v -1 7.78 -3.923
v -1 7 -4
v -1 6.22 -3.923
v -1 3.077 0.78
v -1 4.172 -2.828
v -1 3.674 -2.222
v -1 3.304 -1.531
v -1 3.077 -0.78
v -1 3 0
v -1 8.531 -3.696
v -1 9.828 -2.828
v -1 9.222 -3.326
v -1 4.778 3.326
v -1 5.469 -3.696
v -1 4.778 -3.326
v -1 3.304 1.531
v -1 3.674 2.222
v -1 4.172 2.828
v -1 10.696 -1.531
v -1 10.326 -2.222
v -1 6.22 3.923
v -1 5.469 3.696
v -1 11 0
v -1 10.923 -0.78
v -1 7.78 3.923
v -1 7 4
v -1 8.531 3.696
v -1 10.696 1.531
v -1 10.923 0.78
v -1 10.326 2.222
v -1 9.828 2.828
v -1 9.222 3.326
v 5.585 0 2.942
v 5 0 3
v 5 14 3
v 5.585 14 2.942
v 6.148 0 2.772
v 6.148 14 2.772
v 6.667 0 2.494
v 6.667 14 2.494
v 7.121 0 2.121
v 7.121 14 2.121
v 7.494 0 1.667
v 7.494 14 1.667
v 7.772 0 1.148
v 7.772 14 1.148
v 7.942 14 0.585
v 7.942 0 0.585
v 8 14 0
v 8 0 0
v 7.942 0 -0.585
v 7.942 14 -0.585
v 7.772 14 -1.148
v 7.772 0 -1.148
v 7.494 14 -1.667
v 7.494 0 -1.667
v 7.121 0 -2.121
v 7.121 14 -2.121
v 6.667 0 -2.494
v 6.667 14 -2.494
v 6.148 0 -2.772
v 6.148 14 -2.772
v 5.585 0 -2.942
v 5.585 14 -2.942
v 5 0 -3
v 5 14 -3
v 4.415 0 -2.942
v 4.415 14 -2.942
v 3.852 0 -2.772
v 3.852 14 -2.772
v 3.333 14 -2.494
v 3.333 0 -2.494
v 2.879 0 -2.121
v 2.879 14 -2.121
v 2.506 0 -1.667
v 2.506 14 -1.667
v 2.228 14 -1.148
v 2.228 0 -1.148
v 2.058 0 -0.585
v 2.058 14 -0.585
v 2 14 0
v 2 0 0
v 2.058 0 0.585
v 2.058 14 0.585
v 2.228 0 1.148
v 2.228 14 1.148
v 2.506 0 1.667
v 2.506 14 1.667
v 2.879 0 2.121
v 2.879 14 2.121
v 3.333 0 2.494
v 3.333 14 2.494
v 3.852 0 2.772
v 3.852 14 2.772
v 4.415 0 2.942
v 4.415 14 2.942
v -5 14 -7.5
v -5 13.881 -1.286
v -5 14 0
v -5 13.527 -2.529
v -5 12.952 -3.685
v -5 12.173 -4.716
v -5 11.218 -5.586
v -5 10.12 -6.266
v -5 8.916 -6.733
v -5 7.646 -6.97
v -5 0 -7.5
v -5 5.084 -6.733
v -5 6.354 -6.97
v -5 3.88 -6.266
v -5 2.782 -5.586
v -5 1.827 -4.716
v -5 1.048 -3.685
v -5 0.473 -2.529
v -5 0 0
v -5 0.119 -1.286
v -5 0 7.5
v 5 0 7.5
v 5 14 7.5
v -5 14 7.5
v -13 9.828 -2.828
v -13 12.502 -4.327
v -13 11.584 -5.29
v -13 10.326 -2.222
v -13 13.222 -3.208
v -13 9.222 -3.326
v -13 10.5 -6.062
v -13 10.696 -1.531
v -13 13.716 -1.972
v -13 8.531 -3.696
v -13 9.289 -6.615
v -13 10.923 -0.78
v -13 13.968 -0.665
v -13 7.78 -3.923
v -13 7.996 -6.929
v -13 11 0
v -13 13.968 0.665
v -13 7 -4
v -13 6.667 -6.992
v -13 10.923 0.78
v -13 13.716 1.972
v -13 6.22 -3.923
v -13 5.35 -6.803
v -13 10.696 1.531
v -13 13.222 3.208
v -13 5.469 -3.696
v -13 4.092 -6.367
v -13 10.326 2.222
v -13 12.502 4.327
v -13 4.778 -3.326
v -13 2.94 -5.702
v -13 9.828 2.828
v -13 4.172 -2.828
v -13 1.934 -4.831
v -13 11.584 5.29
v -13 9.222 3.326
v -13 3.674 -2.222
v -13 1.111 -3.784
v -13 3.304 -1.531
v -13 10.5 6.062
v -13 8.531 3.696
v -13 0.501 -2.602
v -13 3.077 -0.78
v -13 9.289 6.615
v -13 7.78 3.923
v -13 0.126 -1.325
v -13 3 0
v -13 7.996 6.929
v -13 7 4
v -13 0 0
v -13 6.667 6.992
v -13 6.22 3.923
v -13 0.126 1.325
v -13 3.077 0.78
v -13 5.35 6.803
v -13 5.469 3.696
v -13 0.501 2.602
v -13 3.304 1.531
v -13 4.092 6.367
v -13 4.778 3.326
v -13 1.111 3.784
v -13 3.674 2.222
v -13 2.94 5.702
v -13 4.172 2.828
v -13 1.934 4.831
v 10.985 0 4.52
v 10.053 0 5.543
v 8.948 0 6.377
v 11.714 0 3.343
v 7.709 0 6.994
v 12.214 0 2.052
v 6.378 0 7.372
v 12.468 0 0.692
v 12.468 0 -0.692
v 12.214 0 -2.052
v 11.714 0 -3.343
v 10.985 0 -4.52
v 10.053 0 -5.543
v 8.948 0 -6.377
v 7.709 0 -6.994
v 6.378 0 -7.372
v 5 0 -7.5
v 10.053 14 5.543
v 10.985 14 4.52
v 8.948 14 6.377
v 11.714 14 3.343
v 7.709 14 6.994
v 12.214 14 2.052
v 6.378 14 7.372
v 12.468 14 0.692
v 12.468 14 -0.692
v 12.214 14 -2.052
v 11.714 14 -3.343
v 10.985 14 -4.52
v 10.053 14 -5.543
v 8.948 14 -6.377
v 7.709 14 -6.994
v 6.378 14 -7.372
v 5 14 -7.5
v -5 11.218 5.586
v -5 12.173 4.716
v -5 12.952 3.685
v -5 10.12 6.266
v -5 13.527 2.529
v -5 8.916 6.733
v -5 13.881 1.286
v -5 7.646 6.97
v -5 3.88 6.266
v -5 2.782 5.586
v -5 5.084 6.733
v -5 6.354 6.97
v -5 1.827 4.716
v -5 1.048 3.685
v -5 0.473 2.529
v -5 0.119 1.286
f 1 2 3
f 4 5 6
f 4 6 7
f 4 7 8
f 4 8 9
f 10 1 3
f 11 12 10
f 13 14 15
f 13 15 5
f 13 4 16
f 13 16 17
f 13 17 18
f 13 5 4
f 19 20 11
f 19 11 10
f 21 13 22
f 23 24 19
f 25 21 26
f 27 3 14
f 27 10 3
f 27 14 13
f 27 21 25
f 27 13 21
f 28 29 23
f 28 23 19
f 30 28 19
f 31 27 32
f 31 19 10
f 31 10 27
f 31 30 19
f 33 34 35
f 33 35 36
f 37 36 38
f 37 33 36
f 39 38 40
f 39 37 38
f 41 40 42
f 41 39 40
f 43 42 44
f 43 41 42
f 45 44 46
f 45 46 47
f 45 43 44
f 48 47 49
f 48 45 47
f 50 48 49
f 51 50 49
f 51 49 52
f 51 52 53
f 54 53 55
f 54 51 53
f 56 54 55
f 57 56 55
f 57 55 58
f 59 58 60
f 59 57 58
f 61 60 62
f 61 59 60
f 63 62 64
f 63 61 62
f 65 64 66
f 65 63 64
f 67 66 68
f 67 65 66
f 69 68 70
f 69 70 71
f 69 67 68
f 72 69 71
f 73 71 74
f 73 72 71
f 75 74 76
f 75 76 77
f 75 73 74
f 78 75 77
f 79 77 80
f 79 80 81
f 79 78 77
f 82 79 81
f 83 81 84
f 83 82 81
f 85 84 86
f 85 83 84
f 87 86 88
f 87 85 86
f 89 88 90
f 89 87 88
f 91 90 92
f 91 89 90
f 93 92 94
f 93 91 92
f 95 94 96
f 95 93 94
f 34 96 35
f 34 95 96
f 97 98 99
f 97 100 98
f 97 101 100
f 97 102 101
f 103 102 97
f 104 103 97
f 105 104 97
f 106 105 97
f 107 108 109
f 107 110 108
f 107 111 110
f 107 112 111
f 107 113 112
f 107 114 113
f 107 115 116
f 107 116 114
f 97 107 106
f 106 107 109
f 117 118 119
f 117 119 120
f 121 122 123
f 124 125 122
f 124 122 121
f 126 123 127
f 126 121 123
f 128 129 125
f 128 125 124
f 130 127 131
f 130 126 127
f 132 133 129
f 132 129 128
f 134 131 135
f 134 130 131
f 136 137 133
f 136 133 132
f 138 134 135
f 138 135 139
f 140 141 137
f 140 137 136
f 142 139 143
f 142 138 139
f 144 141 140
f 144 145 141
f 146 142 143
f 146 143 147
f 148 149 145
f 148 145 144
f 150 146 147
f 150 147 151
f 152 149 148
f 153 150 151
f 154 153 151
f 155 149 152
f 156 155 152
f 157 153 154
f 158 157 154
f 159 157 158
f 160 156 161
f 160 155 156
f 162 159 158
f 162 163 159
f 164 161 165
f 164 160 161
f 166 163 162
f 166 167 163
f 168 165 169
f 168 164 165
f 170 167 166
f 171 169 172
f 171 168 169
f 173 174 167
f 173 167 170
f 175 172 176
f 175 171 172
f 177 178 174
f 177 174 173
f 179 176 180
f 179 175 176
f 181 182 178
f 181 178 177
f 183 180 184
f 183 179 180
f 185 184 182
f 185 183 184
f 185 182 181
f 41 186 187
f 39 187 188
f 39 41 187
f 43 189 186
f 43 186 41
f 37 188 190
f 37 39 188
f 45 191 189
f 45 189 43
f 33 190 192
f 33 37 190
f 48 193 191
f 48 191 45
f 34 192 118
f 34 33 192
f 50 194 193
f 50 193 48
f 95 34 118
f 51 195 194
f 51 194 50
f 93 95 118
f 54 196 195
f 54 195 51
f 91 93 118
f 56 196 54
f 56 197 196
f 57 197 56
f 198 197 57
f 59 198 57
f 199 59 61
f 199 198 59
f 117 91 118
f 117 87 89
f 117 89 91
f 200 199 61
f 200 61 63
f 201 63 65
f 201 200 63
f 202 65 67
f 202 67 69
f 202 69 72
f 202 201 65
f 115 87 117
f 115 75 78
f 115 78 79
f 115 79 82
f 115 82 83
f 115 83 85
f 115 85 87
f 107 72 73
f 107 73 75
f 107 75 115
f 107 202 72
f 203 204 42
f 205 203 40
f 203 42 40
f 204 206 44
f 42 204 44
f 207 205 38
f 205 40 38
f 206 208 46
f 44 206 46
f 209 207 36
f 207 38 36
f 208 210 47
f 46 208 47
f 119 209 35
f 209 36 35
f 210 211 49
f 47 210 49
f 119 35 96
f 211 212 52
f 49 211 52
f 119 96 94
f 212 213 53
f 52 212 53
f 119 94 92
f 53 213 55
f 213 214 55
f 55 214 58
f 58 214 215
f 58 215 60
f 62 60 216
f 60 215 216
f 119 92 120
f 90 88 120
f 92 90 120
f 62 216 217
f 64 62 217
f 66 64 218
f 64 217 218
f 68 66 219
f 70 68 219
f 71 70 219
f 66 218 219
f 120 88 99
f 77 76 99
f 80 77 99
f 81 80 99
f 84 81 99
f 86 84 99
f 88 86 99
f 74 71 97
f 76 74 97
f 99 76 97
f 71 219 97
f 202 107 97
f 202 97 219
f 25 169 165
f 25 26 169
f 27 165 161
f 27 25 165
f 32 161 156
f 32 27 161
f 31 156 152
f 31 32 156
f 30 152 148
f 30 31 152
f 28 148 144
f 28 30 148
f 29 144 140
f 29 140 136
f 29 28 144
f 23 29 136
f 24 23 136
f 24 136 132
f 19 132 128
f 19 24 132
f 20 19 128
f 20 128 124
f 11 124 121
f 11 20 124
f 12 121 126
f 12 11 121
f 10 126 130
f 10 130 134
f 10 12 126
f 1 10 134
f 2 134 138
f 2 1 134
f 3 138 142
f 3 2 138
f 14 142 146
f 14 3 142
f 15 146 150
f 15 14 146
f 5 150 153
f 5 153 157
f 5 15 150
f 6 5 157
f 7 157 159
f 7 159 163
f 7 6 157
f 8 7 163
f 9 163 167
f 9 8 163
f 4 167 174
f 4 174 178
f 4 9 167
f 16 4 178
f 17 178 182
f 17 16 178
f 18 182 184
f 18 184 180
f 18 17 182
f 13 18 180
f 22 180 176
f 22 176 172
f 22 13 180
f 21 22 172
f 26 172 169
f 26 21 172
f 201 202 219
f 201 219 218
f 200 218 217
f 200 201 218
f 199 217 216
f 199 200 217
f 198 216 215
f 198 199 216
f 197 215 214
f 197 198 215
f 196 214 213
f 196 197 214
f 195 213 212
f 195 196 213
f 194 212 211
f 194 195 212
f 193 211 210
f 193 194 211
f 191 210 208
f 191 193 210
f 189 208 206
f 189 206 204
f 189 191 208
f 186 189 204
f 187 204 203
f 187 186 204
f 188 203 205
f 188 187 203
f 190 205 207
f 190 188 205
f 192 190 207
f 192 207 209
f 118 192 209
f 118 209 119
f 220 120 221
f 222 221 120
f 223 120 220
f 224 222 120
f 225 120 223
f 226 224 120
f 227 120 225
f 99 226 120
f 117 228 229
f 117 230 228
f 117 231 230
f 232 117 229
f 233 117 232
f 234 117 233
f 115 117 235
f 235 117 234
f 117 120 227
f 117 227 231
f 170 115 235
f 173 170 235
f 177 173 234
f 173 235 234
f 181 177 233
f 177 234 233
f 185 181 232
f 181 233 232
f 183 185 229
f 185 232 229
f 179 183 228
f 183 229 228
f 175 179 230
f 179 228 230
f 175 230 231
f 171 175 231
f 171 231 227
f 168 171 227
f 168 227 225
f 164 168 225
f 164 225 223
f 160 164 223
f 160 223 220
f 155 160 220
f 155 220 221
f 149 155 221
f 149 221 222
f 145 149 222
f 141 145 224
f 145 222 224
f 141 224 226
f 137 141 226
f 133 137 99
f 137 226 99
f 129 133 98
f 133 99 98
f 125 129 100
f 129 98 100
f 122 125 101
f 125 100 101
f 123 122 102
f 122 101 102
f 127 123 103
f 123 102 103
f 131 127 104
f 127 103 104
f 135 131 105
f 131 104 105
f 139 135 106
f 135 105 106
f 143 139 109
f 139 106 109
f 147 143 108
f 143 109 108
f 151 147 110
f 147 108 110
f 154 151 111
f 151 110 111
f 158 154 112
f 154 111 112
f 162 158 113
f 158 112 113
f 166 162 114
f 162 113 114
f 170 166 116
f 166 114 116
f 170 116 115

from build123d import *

# Parameters (mm, degrees)
SKETCH_1_R          = 3
EXTRUDE_1_DEPTH     = 14
SKETCH_2_R          = 7
SKETCH_2_R_2        = 4
EXTRUDE_2_DEPTH     = 8
CUT_EXTRUDE_START   = -4
SKETCH_2_2_R        = 4
CUT_EXTRUDE_1_DEPTH = 4


with BuildPart() as part:
    # 草图1 → 凸台-拉伸1 (new body)
    with BuildSketch(Plane(origin=(0, 0, 0), x_dir=(1, 0, 0), z_dir=(0, 1, 0))):
        with BuildLine():
            Line((-5, 7.5), (5, 7.5))
            ThreePointArc((5, 7.5), (12.5, 0), (5, -7.5))
            Line((5, -7.5), (-5, -7.5))
            Line((-5, -7.5), (-5, 7.5))
        make_face()
        with Locations((5, 0)):
            Circle(SKETCH_1_R, mode=Mode.SUBTRACT)
    extrude(amount=EXTRUDE_1_DEPTH)

    # 草图2 → 凸台-拉伸2 (add)
    with BuildSketch(Plane.ZY.offset(5)):
        with Locations((0, 7)):
            Circle(SKETCH_2_R)
        with Locations((0, 7)):
            Circle(SKETCH_2_R_2, mode=Mode.SUBTRACT)
    extrude(amount=EXTRUDE_2_DEPTH)

    # 草图2<2> → 切除-拉伸1 (cut)
    with BuildSketch(Plane.ZY.offset(5).offset(CUT_EXTRUDE_START)):
        with Locations((0, 7)):
            Circle(SKETCH_2_2_R)
    extrude(amount=CUT_EXTRUDE_1_DEPTH, mode=Mode.SUBTRACT)


solid = part.part
